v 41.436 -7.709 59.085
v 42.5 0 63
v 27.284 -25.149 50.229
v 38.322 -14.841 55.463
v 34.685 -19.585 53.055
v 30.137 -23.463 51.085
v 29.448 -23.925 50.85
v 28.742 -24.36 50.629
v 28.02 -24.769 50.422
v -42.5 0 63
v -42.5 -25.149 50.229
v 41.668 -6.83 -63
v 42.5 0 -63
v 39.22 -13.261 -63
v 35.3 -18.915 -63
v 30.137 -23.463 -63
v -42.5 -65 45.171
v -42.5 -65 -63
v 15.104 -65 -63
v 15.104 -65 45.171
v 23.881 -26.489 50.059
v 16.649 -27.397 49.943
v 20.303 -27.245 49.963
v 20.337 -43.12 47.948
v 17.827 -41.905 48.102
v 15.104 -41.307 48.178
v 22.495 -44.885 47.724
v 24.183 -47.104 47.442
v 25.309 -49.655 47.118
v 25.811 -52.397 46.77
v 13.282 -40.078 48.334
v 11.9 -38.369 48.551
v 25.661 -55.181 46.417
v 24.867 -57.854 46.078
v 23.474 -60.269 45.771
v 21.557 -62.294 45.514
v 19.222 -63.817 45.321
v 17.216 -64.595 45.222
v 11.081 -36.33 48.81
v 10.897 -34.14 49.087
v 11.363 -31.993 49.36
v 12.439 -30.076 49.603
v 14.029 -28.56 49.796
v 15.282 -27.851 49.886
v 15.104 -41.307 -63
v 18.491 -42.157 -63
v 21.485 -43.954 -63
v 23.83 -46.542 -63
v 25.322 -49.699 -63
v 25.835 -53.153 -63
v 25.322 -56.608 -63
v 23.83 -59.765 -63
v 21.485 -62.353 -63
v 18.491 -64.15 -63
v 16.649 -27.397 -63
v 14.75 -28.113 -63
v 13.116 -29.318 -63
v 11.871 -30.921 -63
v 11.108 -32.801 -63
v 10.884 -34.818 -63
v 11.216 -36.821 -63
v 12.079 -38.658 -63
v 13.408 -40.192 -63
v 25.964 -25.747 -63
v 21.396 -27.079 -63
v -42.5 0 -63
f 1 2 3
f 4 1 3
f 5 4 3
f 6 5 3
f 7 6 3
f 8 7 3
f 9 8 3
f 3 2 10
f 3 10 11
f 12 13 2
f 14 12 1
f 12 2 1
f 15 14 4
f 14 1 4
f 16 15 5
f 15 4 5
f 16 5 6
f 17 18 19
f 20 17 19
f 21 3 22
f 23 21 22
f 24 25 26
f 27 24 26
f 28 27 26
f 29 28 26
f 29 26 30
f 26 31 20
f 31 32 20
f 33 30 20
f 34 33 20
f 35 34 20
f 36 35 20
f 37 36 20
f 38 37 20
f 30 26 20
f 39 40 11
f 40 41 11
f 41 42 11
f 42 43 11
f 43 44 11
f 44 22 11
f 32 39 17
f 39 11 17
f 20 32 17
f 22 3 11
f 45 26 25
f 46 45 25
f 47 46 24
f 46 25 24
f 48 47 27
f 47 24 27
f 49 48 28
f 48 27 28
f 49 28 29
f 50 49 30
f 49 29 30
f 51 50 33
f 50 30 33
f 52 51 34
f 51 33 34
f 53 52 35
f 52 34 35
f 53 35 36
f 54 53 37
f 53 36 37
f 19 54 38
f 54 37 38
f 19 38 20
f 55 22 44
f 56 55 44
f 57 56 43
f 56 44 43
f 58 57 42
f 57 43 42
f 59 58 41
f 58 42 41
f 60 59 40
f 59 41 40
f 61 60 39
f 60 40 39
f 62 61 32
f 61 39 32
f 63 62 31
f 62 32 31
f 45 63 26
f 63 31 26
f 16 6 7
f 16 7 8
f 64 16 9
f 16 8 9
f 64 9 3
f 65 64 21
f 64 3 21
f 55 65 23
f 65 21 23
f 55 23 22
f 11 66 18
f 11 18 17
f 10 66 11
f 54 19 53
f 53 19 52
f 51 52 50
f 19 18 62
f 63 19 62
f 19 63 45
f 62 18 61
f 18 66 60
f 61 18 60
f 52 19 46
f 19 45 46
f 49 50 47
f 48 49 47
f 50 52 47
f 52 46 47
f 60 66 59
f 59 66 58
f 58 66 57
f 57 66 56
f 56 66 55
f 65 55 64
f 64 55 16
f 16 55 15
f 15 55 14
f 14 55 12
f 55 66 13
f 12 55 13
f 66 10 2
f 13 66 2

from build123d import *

# Parameters (mm, degrees)
F0_W     = 85
F0_H     = 126
F1_DEPTH = 65
F3_DEPTH = 200
F5_DEPTH = 100


with BuildPart() as f1:
    # F0 (on Front) → F1 (new body)
    with BuildSketch(Plane.XZ):
        Rectangle(F0_W, F0_H)
    extrude(amount=F1_DEPTH)

    # F2 (on face) → F3 (cut)
    with BuildSketch(Plane.XY.offset(63)):
        with BuildLine():
            ThreePointArc((42.5, 0), (39.220219, -13.260584), (30.137157, -23.463428))
            ThreePointArc((30.137157, -23.463428), (23.716021, -26.537316), (16.649198, -27.397415))
            ThreePointArc((16.649198, -27.397415), (10.926292, -33.802126), (15.103702, -41.306872))
            ThreePointArc((15.103702, -41.306872), (25.834637, -53.153436), (15.103702, -65))
            Line((15.103702, -65), (42.5, -65))
            Line((42.5, -65), (42.5, 0))
        make_face()
    extrude(amount=-F3_DEPTH, mode=Mode.SUBTRACT)

    # F4 (on face) → F5 (cut)
    with BuildSketch(Plane(origin=(-42.5, 0, 0), x_dir=(0, -1, 0), z_dir=(-1, 0, 0))):
        Polygon((65, 63), (0, 63), (25.149422, 50.228592), (65, 45.170609), align=None)
    extrude(amount=-F5_DEPTH, mode=Mode.SUBTRACT)


solid = f1.part
